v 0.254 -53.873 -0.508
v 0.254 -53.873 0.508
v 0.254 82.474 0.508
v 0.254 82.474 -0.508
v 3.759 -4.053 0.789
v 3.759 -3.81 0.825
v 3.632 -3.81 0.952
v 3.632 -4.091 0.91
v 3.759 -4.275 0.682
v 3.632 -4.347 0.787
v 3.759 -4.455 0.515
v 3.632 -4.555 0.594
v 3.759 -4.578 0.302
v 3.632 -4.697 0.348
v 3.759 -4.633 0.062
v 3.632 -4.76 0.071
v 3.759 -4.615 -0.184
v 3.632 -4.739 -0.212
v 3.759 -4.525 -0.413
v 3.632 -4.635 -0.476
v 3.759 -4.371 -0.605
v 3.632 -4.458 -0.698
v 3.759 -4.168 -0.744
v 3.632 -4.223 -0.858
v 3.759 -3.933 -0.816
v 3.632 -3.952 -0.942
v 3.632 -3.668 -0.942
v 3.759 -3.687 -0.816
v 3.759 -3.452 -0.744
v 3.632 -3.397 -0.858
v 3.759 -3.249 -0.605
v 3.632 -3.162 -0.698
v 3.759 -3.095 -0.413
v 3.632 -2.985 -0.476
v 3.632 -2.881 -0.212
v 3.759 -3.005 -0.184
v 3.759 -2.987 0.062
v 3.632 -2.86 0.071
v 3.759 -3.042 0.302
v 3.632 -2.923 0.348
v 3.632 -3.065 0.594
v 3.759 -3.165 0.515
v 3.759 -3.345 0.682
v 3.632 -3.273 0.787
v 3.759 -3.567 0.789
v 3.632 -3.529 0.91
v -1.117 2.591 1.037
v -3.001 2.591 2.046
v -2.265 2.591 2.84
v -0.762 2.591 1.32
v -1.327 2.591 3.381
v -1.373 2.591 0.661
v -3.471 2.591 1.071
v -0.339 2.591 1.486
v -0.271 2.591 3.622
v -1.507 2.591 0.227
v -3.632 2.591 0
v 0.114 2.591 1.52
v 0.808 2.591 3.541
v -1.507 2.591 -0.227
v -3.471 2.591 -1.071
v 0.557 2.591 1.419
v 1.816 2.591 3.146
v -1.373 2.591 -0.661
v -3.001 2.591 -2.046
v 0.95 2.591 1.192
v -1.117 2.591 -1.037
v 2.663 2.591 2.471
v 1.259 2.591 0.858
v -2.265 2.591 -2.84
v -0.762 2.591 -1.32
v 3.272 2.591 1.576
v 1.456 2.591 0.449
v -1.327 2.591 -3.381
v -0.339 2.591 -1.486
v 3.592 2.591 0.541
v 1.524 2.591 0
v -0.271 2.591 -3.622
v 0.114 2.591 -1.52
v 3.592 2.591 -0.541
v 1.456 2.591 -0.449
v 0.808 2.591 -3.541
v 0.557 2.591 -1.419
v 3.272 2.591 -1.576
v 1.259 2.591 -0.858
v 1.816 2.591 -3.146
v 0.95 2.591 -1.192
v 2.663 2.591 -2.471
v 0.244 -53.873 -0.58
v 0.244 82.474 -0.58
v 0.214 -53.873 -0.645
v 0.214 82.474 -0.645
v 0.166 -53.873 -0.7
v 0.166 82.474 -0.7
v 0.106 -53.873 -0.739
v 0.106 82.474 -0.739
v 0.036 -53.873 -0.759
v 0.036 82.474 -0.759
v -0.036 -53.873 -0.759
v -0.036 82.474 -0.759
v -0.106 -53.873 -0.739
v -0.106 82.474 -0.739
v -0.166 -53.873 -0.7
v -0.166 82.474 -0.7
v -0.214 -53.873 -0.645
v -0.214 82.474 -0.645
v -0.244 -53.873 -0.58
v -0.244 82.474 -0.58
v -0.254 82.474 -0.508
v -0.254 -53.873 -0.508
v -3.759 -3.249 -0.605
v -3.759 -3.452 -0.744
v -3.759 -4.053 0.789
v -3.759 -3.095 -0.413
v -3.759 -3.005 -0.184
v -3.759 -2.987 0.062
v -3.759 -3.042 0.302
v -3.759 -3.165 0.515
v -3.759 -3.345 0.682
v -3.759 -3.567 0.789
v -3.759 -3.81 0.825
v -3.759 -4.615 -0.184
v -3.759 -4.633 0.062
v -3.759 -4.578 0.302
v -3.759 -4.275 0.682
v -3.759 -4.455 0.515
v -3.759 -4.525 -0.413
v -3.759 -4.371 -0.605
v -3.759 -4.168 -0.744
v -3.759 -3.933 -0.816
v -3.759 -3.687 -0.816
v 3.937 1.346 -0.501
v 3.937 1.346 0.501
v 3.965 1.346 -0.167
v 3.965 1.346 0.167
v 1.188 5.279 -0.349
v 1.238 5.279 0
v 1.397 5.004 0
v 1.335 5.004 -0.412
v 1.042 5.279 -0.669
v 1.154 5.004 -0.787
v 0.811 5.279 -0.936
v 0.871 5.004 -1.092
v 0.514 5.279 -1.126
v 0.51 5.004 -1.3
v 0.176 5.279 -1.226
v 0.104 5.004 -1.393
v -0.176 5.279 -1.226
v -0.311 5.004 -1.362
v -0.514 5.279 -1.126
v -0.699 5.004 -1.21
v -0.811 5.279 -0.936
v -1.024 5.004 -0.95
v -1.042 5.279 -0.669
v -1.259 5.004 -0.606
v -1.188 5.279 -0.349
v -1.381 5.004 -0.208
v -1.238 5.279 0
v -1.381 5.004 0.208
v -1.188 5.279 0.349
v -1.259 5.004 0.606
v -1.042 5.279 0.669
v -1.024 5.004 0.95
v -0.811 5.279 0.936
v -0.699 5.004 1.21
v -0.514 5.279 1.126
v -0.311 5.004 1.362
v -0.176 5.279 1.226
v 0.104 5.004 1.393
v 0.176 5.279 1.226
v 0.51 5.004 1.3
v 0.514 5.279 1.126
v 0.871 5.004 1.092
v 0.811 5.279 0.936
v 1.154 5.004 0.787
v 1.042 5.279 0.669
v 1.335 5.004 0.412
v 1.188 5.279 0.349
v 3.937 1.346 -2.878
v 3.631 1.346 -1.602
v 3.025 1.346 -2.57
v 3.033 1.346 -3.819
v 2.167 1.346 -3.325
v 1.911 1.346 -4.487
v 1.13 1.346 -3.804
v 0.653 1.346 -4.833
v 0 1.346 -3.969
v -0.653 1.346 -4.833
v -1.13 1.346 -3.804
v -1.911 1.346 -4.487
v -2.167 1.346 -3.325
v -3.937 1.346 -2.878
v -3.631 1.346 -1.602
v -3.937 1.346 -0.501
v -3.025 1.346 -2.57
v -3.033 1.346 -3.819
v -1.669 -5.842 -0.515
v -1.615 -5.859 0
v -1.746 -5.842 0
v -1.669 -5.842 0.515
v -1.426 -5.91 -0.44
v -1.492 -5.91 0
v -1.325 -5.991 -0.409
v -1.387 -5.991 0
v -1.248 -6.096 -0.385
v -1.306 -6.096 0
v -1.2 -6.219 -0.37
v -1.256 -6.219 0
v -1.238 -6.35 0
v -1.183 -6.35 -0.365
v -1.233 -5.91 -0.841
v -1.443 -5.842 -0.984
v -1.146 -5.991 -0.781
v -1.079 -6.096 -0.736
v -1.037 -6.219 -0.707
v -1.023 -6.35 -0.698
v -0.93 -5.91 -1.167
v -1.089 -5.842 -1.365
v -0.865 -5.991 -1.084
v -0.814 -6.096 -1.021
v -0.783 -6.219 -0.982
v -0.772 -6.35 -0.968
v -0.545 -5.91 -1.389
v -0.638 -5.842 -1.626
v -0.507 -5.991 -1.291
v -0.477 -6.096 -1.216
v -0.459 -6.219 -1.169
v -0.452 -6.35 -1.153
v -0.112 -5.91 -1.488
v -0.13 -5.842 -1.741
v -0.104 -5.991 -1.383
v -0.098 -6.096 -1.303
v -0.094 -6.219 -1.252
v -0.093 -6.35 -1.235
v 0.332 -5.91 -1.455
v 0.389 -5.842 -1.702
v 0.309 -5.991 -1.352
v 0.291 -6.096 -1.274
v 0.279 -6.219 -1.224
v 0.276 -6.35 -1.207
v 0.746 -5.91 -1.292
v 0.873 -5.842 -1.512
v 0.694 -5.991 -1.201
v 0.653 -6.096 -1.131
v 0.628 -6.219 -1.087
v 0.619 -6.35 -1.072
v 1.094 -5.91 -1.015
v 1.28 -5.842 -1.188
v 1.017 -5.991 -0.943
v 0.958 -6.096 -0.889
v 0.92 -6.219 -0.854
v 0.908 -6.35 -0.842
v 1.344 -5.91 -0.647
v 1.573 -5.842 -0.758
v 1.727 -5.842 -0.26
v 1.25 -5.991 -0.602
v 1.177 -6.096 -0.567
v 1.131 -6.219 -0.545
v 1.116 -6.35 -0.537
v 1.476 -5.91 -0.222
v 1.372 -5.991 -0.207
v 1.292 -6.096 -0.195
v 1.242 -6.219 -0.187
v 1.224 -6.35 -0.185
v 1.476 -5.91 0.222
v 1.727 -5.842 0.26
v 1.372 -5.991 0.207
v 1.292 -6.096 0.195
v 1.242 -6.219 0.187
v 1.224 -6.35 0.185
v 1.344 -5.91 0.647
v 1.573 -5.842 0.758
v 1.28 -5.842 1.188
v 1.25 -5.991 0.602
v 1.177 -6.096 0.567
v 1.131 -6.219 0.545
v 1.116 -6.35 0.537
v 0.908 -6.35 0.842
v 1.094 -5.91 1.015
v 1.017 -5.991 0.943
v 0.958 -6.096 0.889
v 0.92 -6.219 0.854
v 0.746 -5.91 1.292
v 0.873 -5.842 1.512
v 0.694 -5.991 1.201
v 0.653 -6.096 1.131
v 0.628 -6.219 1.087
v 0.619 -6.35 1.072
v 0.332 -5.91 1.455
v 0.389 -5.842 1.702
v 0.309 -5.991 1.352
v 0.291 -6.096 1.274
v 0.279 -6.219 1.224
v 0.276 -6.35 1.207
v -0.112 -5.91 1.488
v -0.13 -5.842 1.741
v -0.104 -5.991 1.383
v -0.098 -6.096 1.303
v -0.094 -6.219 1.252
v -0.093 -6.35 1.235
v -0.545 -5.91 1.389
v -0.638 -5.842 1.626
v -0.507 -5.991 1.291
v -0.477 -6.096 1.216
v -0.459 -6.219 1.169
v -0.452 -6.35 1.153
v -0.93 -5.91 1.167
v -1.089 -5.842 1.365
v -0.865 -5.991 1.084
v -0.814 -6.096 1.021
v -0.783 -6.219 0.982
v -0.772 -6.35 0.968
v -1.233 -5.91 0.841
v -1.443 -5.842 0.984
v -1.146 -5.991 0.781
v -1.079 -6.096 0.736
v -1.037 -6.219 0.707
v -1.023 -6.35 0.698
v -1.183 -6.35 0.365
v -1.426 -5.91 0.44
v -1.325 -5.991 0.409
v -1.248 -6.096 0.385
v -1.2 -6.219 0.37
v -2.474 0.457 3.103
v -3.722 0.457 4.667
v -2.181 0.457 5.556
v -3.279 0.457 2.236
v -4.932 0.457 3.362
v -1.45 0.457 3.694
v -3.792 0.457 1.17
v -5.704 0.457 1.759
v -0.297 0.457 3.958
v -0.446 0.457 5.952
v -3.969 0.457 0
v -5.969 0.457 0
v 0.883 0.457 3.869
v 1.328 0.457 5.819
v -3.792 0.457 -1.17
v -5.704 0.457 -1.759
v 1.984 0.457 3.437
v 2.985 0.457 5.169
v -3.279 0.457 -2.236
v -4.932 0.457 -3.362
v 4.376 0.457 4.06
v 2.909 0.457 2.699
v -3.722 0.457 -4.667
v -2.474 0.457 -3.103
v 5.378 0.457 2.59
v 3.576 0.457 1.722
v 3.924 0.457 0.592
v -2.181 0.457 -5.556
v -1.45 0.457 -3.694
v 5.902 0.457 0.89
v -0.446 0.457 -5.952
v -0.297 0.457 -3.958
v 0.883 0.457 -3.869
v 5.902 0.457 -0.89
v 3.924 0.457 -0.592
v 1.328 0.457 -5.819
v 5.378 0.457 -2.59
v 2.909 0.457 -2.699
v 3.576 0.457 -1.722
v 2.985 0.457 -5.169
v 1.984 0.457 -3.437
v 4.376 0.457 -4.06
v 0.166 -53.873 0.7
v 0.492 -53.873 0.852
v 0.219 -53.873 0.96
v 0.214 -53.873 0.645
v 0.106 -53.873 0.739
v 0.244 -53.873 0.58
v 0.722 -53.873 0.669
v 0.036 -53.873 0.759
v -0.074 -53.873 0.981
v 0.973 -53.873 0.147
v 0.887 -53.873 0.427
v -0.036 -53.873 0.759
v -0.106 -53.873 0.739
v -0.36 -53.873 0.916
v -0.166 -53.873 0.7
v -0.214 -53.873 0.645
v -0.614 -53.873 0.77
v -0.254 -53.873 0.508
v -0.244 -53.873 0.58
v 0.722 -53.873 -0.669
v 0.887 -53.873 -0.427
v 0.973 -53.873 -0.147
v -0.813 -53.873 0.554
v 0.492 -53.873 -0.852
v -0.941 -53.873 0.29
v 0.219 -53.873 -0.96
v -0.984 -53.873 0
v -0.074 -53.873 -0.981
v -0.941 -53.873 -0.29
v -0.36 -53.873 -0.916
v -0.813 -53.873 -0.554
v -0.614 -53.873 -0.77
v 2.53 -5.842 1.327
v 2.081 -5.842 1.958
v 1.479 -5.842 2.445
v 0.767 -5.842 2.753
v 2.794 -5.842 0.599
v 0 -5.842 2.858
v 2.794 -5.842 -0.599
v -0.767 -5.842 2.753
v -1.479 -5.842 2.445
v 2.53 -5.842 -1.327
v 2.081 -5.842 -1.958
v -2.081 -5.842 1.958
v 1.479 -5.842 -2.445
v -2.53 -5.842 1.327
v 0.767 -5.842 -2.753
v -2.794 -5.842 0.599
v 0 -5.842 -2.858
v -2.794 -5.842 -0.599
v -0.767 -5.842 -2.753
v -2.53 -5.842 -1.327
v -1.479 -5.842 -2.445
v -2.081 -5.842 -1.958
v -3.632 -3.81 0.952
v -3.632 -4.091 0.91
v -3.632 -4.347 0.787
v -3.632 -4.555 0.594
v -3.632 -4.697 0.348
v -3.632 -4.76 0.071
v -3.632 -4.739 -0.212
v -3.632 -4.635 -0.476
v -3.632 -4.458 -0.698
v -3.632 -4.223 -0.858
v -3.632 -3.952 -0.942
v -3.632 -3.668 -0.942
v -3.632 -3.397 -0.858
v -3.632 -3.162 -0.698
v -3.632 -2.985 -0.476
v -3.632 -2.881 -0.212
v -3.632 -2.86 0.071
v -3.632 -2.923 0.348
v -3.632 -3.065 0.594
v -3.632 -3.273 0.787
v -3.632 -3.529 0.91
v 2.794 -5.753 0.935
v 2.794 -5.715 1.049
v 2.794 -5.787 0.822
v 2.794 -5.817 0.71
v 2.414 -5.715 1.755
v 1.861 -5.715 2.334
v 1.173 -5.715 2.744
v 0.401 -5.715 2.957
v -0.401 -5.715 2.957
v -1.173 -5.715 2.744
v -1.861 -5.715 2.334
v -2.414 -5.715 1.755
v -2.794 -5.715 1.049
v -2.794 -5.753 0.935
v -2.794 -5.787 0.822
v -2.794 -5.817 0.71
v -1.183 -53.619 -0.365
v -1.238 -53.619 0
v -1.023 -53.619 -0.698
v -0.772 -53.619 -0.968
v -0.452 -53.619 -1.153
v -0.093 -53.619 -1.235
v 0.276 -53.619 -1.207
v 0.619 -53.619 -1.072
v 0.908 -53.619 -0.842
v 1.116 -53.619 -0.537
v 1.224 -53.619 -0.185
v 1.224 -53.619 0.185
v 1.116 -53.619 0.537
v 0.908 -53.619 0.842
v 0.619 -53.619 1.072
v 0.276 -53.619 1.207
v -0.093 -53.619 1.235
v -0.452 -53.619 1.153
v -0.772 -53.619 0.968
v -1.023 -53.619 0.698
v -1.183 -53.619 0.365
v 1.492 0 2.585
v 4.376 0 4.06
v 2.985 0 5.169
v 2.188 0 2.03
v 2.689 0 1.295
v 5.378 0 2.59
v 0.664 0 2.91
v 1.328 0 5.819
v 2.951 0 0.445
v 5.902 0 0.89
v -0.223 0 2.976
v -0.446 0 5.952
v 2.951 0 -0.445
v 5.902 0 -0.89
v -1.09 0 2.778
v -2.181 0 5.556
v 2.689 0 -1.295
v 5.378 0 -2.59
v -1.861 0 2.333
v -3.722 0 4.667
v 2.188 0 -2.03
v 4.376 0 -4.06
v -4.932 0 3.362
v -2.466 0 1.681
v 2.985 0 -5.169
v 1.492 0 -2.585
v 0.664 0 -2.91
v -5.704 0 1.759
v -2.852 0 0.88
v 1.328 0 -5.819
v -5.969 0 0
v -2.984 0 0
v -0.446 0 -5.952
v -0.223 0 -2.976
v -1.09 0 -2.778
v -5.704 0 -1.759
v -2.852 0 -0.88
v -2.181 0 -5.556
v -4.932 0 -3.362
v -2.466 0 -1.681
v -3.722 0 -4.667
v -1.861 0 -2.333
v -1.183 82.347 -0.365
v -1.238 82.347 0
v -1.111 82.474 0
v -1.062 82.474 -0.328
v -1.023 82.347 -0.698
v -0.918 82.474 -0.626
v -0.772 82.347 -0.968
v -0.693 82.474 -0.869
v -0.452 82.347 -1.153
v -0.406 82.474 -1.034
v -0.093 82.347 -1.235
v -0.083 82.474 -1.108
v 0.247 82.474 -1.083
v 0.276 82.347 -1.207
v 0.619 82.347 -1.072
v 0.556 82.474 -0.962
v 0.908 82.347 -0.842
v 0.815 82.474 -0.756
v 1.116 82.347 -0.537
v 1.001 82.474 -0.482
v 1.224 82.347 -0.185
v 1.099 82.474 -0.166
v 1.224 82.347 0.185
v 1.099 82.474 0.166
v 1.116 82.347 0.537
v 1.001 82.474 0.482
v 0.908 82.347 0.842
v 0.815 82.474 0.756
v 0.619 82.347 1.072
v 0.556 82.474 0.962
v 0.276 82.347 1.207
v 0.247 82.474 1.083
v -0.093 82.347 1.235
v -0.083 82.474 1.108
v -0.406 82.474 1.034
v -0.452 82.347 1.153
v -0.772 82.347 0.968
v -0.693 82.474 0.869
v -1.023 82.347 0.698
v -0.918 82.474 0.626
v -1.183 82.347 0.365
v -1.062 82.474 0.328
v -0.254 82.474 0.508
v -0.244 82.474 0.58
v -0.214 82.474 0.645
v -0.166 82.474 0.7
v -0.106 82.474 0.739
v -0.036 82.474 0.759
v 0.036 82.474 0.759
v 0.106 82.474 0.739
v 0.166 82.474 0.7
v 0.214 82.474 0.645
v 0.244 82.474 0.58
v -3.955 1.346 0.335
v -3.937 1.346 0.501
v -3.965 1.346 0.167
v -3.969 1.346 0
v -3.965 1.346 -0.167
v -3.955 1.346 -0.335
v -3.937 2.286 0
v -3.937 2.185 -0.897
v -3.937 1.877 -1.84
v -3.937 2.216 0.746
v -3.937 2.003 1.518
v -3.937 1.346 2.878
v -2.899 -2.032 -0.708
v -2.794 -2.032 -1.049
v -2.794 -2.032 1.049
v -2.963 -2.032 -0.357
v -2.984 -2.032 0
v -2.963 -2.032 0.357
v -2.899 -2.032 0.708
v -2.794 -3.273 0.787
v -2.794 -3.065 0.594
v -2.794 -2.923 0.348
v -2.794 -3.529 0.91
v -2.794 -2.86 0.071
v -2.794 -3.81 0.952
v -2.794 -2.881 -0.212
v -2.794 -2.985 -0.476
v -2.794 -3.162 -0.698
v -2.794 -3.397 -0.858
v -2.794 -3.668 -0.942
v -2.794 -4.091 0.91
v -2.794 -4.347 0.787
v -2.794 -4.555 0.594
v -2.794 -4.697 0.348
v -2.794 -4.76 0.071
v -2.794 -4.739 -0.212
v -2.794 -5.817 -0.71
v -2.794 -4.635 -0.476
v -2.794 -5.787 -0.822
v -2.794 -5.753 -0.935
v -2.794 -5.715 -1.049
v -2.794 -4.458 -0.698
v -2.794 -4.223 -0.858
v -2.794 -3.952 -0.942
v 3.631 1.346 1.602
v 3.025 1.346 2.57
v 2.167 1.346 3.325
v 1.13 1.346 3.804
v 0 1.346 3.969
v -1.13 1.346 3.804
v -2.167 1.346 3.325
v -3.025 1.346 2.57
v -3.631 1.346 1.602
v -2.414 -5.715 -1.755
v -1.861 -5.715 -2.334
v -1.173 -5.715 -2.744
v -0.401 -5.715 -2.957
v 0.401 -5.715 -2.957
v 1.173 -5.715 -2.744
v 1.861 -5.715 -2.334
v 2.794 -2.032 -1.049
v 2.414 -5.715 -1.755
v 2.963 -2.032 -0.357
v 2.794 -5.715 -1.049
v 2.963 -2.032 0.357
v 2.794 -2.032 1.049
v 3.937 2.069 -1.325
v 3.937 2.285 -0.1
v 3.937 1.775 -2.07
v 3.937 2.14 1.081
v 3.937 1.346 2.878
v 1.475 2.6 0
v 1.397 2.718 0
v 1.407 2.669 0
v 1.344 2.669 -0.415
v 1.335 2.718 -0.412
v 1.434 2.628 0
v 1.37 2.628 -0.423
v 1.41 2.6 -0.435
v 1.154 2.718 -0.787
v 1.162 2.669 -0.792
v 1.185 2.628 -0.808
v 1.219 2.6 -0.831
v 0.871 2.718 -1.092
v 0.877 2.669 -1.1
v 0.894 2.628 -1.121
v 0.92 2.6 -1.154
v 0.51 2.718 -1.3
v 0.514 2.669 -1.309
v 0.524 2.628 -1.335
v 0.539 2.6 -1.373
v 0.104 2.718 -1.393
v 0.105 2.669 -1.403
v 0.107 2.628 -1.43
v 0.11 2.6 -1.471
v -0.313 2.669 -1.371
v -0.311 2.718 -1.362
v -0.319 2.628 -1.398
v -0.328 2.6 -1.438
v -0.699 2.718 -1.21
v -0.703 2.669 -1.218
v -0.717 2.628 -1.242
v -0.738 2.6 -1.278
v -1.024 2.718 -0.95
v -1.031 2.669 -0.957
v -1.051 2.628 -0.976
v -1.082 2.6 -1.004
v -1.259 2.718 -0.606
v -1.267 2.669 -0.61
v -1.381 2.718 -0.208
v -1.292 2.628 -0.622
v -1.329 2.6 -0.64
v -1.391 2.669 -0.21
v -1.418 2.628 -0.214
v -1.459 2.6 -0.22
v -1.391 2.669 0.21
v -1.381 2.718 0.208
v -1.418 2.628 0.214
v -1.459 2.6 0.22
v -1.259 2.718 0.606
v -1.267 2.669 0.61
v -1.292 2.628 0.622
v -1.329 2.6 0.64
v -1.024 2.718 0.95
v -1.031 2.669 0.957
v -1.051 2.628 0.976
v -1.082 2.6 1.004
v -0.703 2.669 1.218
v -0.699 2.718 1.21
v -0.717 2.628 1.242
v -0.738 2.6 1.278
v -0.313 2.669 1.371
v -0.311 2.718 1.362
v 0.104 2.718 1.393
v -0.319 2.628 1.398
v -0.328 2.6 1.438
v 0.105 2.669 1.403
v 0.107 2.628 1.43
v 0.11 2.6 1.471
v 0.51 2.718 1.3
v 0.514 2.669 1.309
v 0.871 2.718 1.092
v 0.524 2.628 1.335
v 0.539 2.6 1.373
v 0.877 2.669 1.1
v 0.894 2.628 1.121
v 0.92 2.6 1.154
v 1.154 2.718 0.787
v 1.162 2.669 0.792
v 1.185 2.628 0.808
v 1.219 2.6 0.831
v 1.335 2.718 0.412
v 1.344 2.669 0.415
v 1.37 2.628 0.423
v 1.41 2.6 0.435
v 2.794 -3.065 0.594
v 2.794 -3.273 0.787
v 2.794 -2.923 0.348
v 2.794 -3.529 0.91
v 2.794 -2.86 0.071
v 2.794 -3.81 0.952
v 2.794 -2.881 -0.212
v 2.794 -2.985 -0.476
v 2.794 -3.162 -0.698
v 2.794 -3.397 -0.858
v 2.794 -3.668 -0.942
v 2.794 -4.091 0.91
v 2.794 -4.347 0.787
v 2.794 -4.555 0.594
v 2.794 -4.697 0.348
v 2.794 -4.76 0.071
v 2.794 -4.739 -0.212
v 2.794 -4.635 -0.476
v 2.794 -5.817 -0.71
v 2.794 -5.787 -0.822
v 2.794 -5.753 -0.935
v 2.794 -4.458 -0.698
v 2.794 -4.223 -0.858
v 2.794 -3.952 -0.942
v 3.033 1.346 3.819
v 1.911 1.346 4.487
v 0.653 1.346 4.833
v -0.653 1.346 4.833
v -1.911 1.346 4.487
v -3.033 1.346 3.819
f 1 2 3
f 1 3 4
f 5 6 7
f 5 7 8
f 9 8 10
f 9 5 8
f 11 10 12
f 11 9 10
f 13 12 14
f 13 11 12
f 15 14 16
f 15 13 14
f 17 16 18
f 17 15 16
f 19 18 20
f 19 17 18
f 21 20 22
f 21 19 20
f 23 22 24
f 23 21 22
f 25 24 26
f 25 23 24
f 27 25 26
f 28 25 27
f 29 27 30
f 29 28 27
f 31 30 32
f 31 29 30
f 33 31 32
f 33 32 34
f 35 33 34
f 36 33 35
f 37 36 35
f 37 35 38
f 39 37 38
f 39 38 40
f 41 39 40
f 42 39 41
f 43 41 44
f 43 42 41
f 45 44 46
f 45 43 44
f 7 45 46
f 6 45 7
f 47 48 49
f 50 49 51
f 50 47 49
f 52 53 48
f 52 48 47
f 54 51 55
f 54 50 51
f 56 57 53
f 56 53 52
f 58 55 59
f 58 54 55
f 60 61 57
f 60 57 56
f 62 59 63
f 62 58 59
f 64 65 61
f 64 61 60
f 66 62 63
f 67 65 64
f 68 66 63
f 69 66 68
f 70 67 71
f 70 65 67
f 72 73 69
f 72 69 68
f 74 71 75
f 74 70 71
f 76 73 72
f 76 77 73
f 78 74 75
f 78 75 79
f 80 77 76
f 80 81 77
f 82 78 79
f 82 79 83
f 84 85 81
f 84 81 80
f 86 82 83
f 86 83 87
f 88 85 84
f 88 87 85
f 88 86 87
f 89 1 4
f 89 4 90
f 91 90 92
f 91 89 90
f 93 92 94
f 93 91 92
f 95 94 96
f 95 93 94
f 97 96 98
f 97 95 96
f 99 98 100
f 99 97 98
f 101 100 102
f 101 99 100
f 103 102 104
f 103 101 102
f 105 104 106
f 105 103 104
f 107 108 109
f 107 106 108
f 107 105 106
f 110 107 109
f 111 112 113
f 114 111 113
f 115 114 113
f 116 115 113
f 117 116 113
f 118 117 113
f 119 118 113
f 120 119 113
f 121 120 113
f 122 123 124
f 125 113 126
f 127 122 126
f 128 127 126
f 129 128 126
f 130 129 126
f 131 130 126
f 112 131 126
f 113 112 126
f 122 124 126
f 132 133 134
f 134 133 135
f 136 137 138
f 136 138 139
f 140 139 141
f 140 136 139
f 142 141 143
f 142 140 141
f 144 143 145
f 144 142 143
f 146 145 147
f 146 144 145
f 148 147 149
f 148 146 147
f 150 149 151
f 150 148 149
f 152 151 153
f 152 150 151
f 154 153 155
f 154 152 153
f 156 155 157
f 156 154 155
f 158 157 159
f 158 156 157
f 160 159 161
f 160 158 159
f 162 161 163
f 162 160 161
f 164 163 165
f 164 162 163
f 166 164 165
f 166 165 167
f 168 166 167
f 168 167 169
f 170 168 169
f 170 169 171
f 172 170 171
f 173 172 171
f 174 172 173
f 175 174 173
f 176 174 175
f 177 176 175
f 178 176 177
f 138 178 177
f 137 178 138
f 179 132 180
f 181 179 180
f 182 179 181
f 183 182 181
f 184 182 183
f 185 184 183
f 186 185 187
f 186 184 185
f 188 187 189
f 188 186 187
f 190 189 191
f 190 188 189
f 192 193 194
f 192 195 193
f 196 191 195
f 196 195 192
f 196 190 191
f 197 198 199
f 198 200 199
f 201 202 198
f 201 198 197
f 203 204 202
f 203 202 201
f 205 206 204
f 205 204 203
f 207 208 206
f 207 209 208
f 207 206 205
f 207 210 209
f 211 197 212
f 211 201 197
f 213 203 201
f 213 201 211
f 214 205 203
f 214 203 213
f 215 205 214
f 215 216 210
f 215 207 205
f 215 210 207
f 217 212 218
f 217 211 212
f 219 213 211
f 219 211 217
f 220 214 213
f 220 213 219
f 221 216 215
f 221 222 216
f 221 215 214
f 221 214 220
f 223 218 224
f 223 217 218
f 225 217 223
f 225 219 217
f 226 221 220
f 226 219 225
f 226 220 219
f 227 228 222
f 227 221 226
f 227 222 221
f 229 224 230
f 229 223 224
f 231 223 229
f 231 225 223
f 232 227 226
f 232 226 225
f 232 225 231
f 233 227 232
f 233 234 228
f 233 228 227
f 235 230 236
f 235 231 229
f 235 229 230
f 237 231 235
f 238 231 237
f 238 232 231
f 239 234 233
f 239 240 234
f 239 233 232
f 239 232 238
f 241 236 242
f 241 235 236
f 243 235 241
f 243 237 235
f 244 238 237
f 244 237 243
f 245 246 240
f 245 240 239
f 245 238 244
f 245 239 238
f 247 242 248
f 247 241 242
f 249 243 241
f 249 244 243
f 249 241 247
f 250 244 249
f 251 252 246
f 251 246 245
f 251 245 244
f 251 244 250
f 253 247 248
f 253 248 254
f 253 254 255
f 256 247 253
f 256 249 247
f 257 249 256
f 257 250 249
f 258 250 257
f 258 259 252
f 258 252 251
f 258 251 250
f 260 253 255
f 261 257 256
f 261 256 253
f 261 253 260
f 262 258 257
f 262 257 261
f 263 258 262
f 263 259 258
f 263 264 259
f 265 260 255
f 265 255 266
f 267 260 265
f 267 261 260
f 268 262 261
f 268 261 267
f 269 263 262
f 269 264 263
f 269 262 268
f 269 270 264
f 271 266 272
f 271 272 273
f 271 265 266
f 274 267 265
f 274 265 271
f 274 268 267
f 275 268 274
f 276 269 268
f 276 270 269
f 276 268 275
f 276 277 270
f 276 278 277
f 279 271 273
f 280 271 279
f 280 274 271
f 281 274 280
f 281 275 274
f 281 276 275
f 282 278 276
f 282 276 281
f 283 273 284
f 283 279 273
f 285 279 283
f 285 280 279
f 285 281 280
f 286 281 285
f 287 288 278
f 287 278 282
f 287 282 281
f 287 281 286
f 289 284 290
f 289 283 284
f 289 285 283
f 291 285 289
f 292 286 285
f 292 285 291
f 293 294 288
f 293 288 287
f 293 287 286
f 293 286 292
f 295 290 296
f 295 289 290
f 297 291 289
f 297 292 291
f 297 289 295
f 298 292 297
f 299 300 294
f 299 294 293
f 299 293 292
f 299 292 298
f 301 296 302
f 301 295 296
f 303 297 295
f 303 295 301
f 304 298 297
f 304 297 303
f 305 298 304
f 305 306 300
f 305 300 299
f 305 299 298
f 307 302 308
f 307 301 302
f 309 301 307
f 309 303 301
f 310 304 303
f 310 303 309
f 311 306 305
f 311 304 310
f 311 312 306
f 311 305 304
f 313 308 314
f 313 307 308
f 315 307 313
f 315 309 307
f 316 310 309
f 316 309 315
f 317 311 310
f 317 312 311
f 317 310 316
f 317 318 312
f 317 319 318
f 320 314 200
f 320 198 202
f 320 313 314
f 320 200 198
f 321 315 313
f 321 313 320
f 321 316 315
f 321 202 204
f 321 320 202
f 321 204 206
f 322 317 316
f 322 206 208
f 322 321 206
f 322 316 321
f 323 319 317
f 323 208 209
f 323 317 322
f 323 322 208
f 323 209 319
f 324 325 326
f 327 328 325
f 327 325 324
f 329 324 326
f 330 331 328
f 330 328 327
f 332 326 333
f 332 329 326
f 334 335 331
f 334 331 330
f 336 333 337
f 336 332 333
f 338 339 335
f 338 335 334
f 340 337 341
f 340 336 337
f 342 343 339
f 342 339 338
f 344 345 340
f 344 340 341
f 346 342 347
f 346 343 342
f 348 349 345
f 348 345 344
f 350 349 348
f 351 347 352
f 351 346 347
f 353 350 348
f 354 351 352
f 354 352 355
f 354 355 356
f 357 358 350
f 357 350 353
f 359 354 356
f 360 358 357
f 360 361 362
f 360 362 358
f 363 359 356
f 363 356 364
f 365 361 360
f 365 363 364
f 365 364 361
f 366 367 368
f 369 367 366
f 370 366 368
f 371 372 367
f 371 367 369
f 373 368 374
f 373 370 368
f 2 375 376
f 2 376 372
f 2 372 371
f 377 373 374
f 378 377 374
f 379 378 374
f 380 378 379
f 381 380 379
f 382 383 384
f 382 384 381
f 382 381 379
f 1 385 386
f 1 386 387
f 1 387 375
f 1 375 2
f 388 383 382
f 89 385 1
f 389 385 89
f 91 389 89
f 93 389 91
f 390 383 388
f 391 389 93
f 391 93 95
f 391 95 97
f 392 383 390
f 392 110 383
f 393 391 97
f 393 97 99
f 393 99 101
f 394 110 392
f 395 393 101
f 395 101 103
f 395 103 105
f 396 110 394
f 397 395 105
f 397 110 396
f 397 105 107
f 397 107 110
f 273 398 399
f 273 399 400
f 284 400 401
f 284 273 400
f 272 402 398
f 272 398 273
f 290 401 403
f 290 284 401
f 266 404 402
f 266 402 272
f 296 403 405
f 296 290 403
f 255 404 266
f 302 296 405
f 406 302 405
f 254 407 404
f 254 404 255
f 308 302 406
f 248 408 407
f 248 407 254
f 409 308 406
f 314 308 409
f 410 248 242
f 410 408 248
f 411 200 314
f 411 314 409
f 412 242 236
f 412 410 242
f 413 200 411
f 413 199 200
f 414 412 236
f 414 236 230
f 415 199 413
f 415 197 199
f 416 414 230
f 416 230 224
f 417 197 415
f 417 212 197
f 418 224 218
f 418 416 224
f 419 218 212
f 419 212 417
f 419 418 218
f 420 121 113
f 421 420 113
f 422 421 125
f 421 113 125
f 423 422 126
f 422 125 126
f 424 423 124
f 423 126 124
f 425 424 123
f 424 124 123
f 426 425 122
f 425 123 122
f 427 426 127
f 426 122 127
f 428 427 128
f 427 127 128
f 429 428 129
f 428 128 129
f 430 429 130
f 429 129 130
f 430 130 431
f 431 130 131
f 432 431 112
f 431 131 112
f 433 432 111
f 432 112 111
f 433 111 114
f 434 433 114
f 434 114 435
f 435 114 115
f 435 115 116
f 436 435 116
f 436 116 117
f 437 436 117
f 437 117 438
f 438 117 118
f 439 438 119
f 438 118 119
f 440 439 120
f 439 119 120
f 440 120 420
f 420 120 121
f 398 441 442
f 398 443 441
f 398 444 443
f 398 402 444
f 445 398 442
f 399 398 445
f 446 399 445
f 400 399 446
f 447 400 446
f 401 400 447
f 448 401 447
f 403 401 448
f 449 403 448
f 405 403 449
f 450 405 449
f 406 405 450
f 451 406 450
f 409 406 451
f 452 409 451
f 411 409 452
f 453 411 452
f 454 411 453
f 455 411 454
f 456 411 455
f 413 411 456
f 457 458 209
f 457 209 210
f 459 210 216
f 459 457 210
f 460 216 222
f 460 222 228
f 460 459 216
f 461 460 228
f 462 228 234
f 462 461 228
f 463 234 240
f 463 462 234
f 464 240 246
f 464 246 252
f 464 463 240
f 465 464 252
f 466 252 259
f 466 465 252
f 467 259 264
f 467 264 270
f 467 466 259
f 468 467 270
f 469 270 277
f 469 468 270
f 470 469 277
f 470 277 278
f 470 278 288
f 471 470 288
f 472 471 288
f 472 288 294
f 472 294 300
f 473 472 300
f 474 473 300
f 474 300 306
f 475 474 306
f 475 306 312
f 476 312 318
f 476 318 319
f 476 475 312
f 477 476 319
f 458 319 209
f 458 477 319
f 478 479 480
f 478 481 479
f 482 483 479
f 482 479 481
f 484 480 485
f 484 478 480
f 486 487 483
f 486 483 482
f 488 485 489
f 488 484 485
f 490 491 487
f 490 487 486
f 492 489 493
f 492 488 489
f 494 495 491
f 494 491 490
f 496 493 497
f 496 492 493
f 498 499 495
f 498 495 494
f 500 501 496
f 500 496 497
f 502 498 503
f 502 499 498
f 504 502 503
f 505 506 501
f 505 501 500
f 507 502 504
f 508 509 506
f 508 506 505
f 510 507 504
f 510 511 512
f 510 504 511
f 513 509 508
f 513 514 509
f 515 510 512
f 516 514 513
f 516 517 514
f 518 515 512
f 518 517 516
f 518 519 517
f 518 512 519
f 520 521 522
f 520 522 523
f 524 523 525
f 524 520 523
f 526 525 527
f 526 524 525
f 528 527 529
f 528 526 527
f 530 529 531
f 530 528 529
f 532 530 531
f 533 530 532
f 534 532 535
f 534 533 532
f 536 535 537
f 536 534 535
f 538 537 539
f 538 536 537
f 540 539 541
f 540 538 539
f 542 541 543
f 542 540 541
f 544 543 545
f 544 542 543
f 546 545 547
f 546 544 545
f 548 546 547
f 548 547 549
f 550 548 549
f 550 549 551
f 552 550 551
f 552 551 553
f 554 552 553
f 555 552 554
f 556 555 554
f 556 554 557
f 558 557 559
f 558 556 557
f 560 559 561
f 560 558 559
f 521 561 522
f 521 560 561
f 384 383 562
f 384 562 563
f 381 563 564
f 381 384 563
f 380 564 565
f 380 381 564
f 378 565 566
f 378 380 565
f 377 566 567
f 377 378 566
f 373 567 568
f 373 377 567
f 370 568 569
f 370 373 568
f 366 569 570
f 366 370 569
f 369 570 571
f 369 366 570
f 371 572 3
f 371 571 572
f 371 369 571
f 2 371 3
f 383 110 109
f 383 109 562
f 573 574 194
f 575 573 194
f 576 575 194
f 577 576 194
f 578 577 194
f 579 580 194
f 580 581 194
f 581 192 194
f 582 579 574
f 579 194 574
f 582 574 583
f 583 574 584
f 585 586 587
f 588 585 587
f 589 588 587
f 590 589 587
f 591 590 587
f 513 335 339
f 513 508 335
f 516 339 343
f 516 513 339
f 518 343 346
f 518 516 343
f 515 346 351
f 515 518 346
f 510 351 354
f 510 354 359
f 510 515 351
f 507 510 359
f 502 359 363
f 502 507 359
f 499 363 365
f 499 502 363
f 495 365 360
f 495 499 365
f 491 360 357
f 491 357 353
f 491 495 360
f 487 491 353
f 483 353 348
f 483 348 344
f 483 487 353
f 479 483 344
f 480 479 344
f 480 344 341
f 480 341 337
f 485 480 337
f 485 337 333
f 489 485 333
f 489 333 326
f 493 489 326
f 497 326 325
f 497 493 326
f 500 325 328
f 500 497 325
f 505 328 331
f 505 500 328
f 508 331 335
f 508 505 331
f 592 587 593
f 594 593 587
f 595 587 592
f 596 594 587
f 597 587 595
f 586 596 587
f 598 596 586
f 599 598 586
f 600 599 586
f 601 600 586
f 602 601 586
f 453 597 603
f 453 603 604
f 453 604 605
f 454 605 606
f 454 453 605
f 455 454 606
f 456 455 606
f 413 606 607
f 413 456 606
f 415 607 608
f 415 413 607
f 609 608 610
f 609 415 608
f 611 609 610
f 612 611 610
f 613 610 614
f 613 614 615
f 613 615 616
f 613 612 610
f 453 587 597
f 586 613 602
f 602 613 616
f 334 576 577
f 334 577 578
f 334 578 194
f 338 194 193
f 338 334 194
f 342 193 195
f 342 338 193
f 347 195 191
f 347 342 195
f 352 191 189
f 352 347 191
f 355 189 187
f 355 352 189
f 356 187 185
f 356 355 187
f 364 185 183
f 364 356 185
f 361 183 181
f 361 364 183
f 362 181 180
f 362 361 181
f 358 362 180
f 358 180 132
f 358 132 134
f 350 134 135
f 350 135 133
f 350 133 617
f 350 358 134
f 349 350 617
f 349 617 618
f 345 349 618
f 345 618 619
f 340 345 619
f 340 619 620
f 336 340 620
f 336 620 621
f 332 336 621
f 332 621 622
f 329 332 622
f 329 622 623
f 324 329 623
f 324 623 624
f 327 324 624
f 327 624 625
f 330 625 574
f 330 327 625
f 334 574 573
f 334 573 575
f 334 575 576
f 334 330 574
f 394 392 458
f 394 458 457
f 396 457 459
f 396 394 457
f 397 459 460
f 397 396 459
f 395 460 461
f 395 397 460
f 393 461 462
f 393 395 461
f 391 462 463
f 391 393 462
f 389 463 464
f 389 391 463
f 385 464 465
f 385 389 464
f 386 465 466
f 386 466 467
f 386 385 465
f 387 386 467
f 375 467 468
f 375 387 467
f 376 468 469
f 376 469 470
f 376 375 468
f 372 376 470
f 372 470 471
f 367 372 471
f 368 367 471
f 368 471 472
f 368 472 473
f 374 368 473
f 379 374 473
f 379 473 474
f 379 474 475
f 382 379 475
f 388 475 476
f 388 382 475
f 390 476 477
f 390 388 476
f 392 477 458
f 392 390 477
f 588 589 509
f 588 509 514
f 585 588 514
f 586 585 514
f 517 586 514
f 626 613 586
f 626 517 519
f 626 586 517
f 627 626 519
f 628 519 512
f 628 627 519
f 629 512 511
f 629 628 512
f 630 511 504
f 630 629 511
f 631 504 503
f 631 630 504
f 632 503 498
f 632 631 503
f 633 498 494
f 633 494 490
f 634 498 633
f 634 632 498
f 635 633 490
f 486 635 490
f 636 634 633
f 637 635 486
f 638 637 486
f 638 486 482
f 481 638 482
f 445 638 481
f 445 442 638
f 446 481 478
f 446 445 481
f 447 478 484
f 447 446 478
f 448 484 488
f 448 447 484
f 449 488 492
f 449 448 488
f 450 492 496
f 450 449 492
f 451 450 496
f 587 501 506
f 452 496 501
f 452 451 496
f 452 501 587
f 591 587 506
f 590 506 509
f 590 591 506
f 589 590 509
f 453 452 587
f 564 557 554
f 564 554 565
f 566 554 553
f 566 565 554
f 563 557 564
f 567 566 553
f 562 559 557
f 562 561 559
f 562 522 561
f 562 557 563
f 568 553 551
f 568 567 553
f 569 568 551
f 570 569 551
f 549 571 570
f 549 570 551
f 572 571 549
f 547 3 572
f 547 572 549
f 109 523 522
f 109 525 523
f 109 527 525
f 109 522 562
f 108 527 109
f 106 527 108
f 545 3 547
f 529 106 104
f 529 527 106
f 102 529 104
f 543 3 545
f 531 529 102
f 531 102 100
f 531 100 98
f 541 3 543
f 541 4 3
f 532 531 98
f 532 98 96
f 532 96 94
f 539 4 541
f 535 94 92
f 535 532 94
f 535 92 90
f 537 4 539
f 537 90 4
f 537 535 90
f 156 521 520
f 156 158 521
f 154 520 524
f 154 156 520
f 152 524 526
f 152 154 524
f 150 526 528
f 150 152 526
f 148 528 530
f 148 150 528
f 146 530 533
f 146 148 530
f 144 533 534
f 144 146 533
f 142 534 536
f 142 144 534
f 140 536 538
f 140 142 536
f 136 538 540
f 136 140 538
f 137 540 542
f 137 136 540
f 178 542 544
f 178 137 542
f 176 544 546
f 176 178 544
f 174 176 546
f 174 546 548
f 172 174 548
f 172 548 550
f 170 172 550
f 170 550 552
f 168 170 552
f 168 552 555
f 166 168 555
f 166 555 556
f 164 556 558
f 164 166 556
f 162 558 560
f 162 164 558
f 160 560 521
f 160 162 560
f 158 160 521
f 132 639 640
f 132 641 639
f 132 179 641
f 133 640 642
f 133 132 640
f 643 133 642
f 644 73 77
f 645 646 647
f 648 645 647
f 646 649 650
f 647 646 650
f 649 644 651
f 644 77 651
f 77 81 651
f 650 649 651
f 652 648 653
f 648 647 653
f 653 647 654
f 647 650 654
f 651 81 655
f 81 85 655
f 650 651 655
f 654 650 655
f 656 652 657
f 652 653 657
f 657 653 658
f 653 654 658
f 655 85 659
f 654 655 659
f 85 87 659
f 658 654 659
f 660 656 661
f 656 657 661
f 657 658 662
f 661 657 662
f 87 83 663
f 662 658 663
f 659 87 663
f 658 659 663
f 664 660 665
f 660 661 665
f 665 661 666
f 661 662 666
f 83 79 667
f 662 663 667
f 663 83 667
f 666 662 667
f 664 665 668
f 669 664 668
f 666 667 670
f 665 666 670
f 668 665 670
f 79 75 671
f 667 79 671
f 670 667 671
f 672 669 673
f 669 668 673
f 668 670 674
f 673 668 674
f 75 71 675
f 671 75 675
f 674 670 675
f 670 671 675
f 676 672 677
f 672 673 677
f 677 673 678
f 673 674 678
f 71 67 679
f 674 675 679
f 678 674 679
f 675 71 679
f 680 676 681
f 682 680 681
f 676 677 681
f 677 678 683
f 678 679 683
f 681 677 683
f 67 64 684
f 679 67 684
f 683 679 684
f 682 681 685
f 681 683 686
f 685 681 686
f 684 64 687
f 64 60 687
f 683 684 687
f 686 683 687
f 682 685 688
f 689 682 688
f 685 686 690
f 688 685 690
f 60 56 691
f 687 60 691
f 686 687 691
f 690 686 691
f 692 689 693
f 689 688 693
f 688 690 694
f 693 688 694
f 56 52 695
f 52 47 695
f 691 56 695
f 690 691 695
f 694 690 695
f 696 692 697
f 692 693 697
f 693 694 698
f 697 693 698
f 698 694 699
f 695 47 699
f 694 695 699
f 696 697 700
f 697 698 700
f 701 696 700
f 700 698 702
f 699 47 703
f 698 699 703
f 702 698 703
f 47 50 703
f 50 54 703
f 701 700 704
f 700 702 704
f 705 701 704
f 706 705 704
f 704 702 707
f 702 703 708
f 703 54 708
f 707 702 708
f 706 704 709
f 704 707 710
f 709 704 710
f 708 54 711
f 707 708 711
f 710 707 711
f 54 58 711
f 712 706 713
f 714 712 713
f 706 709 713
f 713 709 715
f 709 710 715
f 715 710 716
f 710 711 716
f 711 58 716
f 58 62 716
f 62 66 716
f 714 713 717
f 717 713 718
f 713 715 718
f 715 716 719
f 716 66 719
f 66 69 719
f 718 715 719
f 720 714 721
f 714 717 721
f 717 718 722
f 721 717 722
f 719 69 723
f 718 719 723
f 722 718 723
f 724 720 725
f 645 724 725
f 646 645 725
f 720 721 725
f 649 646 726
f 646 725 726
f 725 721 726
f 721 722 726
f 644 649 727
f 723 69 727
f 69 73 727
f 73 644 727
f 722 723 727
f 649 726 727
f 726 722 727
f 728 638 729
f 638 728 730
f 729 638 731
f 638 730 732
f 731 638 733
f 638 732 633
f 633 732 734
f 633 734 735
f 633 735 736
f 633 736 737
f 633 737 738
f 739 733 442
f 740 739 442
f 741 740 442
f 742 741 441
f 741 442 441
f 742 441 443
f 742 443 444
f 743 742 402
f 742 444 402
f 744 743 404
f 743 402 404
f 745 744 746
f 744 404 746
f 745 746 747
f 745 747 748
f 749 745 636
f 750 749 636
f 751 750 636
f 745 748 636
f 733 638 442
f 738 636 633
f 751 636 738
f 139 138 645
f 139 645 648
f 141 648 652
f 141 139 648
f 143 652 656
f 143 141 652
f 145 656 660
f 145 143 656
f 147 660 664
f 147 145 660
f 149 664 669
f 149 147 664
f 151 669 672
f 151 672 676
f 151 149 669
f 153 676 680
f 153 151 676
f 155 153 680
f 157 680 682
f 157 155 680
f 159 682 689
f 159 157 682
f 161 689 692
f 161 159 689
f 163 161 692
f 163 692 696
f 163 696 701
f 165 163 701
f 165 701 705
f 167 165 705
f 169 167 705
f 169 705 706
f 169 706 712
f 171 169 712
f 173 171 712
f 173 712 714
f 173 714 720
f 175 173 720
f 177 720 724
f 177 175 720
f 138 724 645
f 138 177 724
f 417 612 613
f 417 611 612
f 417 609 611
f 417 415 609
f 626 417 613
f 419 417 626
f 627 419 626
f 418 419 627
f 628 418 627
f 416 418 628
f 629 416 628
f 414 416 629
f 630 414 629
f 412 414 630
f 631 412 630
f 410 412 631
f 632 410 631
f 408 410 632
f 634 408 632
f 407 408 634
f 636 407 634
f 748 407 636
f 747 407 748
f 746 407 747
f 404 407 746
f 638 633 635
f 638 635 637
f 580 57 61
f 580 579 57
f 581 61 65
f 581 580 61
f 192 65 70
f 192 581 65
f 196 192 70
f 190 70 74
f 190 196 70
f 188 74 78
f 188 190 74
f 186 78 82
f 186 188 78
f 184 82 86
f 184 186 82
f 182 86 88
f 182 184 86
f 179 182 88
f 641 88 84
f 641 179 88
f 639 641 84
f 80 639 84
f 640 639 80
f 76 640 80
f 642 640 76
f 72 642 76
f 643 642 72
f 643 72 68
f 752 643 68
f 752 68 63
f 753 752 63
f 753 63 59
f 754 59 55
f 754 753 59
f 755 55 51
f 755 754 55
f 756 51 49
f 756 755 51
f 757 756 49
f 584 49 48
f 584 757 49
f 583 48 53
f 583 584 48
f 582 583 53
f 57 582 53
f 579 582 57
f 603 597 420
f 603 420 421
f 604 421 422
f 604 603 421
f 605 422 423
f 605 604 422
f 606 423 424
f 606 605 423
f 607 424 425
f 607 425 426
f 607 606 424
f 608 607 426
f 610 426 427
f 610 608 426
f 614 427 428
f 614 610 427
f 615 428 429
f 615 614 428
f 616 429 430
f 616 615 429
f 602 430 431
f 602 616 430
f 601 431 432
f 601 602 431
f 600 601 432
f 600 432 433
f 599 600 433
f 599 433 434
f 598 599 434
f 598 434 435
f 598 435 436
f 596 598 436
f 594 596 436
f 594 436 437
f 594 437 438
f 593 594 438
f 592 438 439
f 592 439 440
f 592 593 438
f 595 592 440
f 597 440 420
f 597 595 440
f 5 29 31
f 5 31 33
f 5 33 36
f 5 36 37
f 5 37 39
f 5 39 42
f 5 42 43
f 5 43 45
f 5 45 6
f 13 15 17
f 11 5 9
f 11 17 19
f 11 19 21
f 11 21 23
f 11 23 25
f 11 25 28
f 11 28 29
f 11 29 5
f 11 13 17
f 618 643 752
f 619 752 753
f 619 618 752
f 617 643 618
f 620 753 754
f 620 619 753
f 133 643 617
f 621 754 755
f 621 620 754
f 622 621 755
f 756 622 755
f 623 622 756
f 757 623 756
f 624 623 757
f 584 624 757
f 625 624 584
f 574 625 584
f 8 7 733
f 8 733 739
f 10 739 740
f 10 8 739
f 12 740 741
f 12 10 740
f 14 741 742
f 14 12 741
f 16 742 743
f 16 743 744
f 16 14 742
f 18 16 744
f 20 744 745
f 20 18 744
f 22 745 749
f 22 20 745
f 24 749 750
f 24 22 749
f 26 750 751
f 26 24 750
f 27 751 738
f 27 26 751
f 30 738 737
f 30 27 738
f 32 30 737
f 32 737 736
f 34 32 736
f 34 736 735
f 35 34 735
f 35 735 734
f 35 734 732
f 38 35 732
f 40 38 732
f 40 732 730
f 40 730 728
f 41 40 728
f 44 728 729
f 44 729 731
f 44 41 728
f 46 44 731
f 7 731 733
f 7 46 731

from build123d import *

# Parameters (mm, degrees)
CHAMFER1_SIZE       = 0.254
CUT_EXTRUDE3_DEPTH  = 3.81
SKETCH5_R           = 0.9525
BOSS_EXTRUDE1_DEPTH = 3.7592
CUT_EXTRUDE1_DEPTH  = 137.608260621
CHAMFER2_SIZE       = 0.127
CUT_EXTRUDE4_REACH  = 83.566
FILLET1_R           = 0.508
FILLET2_R           = 0.127


with BuildPart() as part:
    # Sketch1 → Revolve1 (revolve)
    with BuildSketch(Plane.XY, mode=Mode.PRIVATE) as revolve1_sk:
        Polygon((0, 82.4738), (1.23825, 82.4738), (1.23825, 2.5908), (3.6322, 2.5908), (4.8768, 1.3462), (3.96875, 1.3462), (3.96875, 0.4572), (5.969, 0.4572), (5.969, 0), (2.9845, 0), (2.9845, -5.842), (1.23825, -5.842), (1.23825, -53.8734), (0, -53.8734), align=None)
    revolve(revolve1_sk.sketch.rotate(Axis((0, 82.4738, 0), (0, -1, 0)), 180), axis=Axis((0, 82.4738, 0), (0, -1, 0)))

    # Chamfer1
    chamfer1_edges = [part.edges().sort_by_distance(p)[0] for p in [
        (1.23825, -53.8734, 0),
    ]]
    chamfer(chamfer1_edges, length=CHAMFER1_SIZE)

    # Sketch4 → Cut-Extrude3 (cut)
    with BuildSketch(Plane.XZ.offset(5.842)):
        with BuildLine():
            Line((-2.794, 1.049192189), (-2.794, -1.049192189))
            ThreePointArc((-2.794, -1.049192189), (-2.9845, 0), (-2.794, 1.049192189))
        make_face()
        with BuildLine():
            Line((2.794, 1.049192189), (2.794, -1.049192189))
            ThreePointArc((2.794, -1.049192189), (2.9845, 0), (2.794, 1.049192189))
        make_face()
    extrude(amount=-CUT_EXTRUDE3_DEPTH, mode=Mode.SUBTRACT)

    # Sketch5 → Boss-Extrude1 (add, symmetric)
    with BuildSketch(Plane(origin=(0, 0, 0), x_dir=(0, 0, -1), z_dir=(1, 0, 0))):
        with Locations(Location((0, -3.81, 0), (0, 0, 180))):
            Circle(SKETCH5_R)
    extrude(amount=BOSS_EXTRUDE1_DEPTH, both=True)

    # Sketch2 → Cut-Extrude1 (cut, through all)
    with BuildSketch(Plane.XZ.offset(53.8734)):
        with BuildLine():
            Line((0.254, 0.508), (0.254, -0.508))
            ThreePointArc((0.254, -0.508), (0, -0.762), (-0.254, -0.508))
            Line((-0.254, -0.508), (-0.254, 0.508))
            ThreePointArc((-0.254, 0.508), (0, 0.762), (0.254, 0.508))
        make_face()
    extrude(amount=-CUT_EXTRUDE1_DEPTH, mode=Mode.SUBTRACT)

    # Chamfer2
    chamfer2_edges = [part.edges().sort_by_distance(p)[0] for p in [
        (0, -5.842, 2.9845),
        (1.23825, 82.4738, 0),
        (0, -5.842, -2.9845),
        (-3.7592, -3.81, -0.9525),
        (3.7592, -3.81, -0.9525),
    ]]
    chamfer(chamfer2_edges, length=CHAMFER2_SIZE)

    # Sketch6 → Cut-Extrude4 (cut, up to next)
    with BuildSketch(Plane.XZ.offset(-1.3462), mode=Mode.PRIVATE) as cut_extrude4_sk1:
        with BuildLine():
            Line((-3.937, -2.878056504), (-3.937, 2.878056504))
            ThreePointArc((-3.937, 2.878056504), (-4.8768, 0), (-3.937, -2.878056504))
        make_face()
    cut_extrude4_tool1 = extrude(cut_extrude4_sk1.sketch, amount=-CUT_EXTRUDE4_REACH, mode=Mode.PRIVATE) & part.part
    # Sketch6 → Cut-Extrude4 (cut, up to next)
    with BuildSketch(Plane.XZ.offset(-1.3462), mode=Mode.PRIVATE) as cut_extrude4_sk2:
        with BuildLine():
            Line((3.937, -2.878056504), (3.937, 2.878056504))
            ThreePointArc((3.937, 2.878056504), (4.8768, 0), (3.937, -2.878056504))
        make_face()
    cut_extrude4_tool2 = extrude(cut_extrude4_sk2.sketch, amount=-CUT_EXTRUDE4_REACH, mode=Mode.PRIVATE) & part.part
    add(cut_extrude4_tool1.solids().sort_by_distance((-4.316209, 1.3462, 0))[0], mode=Mode.SUBTRACT)
    add(cut_extrude4_tool2.solids().sort_by_distance((4.316209, 1.3462, 0))[0], mode=Mode.SUBTRACT)

    # Fillet1
    fillet1_edges = [part.edges().sort_by_distance(p)[0] for p in [
        (1.23825, -5.842, 0),
    ]]
    fillet(fillet1_edges, radius=FILLET1_R)

    # Sketch7 → Revolve2 (revolve)
    with BuildSketch(Plane.XY):
        Polygon((1.23825, 5.278763066), (1.23825, 2.5908), (1.397, 2.5908), (1.397, 5.0038), align=None)
    revolve(axis=Axis((0, 0, 0), (0, 1, 0)))

    # Fillet2
    fillet2_edges = [part.edges().sort_by_distance(p)[0] for p in [
        (-1.397, 2.5908, 0),
    ]]
    fillet(fillet2_edges, radius=FILLET2_R)


solid = part.part
